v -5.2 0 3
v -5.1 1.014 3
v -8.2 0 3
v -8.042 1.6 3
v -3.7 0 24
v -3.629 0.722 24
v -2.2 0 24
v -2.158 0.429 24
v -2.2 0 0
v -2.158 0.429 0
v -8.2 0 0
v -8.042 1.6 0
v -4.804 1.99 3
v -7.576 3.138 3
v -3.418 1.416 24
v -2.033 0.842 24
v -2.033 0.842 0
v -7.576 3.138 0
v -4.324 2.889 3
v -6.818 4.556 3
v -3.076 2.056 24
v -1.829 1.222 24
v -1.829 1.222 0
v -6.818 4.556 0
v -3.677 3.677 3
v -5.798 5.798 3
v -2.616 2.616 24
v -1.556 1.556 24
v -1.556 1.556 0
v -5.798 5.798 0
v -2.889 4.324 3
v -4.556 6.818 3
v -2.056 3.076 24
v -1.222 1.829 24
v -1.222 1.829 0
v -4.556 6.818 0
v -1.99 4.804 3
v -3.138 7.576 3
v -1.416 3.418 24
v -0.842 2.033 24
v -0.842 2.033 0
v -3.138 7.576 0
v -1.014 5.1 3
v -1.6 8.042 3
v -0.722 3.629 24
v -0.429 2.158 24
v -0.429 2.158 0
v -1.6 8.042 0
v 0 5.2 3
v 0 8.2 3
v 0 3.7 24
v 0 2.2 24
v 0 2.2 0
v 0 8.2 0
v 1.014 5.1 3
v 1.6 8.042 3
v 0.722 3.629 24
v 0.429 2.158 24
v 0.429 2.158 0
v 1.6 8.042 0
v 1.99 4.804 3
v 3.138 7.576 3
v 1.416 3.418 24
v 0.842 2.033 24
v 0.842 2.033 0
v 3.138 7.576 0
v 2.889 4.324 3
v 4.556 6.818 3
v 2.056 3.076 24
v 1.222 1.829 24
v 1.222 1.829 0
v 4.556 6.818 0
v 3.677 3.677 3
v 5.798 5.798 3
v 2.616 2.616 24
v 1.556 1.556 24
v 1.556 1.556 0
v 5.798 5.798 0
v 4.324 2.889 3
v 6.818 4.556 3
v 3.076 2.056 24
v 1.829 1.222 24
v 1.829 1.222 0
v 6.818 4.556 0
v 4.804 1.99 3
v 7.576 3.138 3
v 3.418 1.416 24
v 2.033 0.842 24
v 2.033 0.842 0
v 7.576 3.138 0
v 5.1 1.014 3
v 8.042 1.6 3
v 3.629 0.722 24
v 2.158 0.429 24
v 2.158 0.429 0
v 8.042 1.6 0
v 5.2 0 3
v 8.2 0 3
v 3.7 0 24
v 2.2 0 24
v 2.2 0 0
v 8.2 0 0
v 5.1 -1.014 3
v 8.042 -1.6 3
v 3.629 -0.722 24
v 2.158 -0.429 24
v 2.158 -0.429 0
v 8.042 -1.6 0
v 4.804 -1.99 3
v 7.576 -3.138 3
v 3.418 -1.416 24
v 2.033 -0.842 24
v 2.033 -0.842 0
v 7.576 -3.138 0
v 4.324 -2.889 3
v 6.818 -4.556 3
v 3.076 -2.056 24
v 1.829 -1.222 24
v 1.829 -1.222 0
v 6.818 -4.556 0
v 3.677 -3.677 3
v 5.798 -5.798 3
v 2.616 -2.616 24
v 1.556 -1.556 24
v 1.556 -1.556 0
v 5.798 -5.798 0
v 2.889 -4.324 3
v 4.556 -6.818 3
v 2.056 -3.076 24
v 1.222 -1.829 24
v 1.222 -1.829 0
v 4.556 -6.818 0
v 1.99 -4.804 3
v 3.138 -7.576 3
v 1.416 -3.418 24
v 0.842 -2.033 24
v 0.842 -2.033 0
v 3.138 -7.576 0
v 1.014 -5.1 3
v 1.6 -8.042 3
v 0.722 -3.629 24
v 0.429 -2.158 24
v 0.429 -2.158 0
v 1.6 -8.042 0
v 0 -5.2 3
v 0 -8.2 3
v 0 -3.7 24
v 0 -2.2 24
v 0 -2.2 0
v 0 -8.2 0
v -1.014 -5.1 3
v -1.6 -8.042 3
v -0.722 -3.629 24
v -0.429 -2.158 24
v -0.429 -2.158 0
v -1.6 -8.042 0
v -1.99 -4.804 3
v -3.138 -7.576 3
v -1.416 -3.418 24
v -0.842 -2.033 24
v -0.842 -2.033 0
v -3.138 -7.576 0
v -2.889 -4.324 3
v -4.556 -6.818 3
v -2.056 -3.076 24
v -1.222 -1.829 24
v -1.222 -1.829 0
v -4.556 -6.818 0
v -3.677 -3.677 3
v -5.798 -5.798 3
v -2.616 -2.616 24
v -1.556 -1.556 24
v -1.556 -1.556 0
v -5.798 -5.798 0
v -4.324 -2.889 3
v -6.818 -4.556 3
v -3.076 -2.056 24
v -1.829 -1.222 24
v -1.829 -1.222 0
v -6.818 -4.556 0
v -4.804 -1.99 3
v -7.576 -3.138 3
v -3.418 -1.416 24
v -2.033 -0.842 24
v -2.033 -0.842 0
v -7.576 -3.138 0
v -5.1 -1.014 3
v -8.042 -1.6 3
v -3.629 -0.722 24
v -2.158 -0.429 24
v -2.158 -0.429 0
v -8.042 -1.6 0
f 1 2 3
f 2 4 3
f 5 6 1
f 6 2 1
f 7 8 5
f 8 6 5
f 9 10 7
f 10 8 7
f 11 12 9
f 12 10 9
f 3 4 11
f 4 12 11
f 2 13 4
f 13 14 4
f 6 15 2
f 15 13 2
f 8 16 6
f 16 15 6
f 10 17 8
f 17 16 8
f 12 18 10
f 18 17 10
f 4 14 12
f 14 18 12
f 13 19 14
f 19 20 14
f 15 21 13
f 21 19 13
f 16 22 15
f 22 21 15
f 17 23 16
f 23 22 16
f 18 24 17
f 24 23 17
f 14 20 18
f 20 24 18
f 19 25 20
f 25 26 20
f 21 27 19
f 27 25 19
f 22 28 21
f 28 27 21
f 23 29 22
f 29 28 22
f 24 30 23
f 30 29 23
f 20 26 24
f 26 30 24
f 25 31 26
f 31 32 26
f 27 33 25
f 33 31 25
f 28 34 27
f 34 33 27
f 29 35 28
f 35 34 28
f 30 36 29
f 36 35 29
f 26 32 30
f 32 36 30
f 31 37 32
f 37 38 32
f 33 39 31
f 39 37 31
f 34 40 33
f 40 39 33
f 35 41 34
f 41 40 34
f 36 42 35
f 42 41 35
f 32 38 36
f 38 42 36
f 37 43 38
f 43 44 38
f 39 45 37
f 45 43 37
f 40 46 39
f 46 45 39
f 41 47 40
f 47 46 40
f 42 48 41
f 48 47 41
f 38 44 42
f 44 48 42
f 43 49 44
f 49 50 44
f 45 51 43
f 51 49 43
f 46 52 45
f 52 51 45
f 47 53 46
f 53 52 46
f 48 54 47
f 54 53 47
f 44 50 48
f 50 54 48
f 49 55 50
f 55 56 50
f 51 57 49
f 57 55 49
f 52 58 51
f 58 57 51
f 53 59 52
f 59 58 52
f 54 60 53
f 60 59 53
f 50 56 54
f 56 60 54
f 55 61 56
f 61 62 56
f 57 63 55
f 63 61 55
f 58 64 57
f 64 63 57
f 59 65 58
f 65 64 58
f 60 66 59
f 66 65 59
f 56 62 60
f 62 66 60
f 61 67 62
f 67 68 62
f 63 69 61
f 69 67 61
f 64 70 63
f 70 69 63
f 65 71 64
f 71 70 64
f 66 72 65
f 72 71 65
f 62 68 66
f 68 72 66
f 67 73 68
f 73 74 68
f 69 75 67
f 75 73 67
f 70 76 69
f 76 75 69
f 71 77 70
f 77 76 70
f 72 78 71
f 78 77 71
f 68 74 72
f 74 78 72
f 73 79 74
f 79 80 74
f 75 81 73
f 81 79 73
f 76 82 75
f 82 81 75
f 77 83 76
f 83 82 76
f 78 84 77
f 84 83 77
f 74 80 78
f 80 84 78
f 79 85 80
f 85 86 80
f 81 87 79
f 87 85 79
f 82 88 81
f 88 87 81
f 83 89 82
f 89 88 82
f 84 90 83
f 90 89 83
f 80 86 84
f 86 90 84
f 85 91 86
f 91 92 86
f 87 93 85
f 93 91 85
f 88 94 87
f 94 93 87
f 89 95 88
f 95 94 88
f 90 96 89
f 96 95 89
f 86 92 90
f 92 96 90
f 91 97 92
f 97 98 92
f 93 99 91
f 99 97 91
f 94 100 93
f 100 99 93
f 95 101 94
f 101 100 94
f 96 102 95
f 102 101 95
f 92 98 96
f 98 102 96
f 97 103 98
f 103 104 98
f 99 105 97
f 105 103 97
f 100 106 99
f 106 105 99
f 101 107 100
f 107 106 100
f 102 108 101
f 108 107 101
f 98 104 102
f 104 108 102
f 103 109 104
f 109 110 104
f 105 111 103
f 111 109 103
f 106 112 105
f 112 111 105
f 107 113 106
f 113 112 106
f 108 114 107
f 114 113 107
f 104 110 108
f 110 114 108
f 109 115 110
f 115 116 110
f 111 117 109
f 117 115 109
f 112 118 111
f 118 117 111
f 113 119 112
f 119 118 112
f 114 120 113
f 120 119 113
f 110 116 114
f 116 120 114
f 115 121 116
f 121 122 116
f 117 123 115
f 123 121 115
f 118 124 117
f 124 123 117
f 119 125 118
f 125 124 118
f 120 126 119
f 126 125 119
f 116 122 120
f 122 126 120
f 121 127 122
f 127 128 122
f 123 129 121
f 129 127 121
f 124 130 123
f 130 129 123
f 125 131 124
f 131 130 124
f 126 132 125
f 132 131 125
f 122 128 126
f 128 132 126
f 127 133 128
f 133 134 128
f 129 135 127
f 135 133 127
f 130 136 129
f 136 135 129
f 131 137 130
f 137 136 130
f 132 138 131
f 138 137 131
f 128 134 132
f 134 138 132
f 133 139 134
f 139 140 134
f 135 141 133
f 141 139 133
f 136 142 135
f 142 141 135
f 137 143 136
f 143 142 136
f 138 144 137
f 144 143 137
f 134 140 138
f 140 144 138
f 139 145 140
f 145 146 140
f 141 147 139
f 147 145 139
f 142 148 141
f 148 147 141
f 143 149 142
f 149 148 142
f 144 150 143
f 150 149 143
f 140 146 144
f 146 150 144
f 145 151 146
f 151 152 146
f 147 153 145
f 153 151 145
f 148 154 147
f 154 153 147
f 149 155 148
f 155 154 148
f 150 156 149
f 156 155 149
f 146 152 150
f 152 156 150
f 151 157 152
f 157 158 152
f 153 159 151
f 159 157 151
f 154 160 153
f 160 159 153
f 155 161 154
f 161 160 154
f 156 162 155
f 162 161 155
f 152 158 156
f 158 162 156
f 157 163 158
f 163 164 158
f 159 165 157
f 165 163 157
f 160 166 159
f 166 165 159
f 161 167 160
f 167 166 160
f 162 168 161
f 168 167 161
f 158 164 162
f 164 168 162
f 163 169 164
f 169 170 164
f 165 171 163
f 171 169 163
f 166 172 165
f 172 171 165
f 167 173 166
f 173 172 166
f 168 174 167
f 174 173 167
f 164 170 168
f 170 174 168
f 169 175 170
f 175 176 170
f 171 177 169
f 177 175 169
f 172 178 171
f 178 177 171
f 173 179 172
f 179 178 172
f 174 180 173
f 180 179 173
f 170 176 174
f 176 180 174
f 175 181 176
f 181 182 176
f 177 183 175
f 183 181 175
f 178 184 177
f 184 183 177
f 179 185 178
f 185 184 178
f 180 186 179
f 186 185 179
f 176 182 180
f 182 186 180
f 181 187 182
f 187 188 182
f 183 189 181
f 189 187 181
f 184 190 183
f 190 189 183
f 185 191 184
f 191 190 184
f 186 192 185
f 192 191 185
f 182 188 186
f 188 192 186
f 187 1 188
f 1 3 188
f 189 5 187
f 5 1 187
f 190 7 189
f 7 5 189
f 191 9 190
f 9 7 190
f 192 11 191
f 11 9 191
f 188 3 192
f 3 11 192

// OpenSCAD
$fn = 32;

// ----------------------------------------------------------------------
// Profiled standoff: conical spacer, 24 mm long, bore 4.4 mm
// ----------------------------------------------------------------------

// --- parameters (mm) ---
revolve_angle = 360;      // full turn around the Z axis
profile_points = 6;       // points of the closed outline

profile = [[2.2, 0], [8.2, 0], [8.2, 3], [5.2, 3], [3.7, 24], [2.2, 24]];  // single closed polygon, 6 points, counter clockwise

// --- the one profile operation ---
rotate_extrude(angle = revolve_angle) polygon(points = profile);
